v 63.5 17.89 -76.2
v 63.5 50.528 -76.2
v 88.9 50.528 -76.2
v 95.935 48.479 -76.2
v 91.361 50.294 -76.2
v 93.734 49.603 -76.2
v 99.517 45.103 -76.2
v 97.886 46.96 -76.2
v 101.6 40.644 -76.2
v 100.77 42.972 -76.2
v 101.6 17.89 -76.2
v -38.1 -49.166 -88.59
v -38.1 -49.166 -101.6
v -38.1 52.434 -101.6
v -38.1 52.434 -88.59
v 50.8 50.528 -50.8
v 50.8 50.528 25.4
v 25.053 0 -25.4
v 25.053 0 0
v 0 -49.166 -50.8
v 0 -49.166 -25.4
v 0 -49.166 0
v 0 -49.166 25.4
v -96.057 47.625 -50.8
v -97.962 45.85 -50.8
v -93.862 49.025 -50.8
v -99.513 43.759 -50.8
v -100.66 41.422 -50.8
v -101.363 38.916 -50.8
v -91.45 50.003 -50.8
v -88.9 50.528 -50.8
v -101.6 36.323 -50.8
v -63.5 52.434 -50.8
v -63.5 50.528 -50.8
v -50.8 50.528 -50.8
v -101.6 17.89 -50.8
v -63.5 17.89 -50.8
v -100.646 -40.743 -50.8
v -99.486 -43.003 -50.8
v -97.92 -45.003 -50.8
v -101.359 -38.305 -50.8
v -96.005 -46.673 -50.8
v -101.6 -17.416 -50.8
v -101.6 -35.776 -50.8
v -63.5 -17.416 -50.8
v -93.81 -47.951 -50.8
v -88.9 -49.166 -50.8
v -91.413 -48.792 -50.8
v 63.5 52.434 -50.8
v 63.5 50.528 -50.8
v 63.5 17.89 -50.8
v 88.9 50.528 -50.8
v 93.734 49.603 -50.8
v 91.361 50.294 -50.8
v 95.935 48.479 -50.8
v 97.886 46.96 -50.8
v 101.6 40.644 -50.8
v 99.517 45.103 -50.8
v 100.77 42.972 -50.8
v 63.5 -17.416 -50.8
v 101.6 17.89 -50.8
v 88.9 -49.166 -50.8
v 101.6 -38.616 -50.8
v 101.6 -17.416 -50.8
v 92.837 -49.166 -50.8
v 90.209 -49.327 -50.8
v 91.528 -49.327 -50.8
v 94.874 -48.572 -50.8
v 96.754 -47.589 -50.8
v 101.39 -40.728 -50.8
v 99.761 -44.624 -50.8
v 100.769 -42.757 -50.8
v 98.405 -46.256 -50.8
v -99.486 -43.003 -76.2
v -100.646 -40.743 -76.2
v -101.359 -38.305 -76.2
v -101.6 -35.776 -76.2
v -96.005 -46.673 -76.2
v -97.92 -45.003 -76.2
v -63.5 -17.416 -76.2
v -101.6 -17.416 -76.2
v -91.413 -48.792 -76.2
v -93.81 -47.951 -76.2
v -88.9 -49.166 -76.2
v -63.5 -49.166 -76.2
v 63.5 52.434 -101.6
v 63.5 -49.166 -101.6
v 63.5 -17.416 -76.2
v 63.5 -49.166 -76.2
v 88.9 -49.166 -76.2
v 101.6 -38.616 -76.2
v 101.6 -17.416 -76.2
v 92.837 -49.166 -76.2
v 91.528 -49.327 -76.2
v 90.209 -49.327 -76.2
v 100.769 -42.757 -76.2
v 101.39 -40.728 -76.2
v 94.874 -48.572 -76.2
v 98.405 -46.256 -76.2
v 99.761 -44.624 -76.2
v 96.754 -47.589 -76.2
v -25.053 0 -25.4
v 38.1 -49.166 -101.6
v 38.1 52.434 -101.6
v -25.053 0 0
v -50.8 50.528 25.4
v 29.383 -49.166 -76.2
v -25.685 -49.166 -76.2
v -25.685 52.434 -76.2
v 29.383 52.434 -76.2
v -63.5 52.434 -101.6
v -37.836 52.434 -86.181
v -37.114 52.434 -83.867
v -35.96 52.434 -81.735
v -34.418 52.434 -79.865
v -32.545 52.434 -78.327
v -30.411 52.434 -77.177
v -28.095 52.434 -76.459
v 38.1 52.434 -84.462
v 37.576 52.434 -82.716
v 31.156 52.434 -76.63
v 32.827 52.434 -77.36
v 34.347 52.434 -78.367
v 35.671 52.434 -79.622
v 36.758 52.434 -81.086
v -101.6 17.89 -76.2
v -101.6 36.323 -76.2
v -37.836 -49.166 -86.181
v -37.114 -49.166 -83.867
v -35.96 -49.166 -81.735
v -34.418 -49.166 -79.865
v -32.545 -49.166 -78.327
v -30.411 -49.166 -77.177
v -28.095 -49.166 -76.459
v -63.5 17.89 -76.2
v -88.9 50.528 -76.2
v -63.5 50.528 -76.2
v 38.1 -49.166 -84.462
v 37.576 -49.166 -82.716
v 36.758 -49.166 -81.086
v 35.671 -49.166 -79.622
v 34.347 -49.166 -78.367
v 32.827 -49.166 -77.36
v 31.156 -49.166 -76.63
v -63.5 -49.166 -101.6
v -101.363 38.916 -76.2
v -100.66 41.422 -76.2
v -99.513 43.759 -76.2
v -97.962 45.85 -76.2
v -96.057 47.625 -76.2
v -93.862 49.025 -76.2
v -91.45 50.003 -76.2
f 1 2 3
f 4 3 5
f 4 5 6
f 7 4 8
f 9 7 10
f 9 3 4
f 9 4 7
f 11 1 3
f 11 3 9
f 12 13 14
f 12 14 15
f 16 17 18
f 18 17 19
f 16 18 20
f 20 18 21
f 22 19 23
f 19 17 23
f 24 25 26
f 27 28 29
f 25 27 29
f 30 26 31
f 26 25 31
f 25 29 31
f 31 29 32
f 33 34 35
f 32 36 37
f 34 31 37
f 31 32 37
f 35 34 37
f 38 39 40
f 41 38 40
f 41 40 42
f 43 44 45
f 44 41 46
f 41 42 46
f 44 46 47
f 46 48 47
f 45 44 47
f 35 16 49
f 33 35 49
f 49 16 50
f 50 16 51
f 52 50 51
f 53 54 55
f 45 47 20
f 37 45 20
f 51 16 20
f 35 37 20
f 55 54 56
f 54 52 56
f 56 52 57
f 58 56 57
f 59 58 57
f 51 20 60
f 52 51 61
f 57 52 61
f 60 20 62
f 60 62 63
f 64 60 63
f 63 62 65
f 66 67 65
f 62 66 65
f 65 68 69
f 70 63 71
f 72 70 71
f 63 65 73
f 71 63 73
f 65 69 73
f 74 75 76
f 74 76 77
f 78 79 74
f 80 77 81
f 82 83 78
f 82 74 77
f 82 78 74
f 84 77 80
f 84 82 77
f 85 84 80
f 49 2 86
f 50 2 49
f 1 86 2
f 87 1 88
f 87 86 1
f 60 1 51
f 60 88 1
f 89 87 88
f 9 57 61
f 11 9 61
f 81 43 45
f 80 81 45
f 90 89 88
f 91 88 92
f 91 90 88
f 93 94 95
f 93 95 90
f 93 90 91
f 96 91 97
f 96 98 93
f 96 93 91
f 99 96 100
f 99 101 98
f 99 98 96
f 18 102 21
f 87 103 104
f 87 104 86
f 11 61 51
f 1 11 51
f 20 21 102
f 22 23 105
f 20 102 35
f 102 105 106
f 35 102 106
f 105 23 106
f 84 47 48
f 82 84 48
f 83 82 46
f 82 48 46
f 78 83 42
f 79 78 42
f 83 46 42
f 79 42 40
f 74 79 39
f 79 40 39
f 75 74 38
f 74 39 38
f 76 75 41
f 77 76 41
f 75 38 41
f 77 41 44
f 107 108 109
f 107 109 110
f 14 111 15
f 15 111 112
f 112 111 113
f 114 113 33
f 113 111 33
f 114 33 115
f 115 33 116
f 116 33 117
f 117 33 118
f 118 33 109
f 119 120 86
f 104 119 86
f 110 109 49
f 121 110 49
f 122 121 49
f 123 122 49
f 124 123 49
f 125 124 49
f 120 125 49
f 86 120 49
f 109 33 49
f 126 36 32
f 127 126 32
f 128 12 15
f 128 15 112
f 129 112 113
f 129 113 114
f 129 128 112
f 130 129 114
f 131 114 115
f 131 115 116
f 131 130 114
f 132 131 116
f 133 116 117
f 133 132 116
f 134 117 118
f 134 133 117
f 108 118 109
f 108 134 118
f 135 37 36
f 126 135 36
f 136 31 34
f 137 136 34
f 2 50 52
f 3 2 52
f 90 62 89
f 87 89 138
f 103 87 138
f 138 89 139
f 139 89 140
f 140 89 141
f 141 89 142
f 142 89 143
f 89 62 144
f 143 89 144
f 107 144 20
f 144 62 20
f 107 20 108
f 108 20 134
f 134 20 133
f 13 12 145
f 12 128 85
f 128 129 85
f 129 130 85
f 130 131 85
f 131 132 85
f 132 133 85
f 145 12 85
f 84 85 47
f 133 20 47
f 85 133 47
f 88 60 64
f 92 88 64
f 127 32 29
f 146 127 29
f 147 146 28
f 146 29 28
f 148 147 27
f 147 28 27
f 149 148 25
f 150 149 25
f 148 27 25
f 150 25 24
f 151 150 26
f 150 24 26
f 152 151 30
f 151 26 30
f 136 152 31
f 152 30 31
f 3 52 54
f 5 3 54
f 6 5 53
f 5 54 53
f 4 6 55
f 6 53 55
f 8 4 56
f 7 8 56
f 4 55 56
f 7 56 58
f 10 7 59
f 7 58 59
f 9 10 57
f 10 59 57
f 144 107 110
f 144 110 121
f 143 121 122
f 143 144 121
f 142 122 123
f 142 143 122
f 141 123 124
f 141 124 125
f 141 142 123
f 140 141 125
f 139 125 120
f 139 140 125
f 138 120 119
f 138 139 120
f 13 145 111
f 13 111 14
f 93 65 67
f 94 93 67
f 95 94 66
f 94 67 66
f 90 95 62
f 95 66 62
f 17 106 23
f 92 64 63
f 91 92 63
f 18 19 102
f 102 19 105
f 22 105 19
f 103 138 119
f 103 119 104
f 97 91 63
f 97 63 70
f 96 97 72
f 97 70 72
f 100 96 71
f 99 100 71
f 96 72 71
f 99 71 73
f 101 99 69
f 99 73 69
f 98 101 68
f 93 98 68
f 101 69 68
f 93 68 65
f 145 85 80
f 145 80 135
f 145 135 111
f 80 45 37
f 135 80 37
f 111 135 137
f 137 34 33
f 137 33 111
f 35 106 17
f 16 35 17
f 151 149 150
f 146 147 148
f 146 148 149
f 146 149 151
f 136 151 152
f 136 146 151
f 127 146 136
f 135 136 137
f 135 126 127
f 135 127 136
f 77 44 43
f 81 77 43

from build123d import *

# Parameters (mm, degrees)
F1_DEPTH  = 25.4
F3_DEPTH  = 25.4
F5_DEPTH  = 25.4
F6_DEPTH  = 25.4
F8_DEPTH  = 25.4
F9_DEPTH  = 25.4
F11_DEPTH = 101.6


with BuildPart() as f1:
    # F0 (on Top) → F1 (new body)
    with BuildSketch(Plane.XY):
        Polygon((50.8, 50.5276115144), (-50.8, 50.5276115144), (0, -49.1656845147), align=None)
    extrude(amount=F1_DEPTH)

    # F2 (on face) → F3 (join)
    with BuildSketch(Plane(origin=(0, 0, 0), x_dir=(1, 0, 0), z_dir=(0, 0, -1))):
        Polygon((0, 0), (-25.0530062986, 0), (-50.8, -50.5276115144), (50.8, -50.5276115144), (25.0530062986, 0), align=None)
    extrude(amount=F3_DEPTH)

    # F4 (on face) → F5 (join)
    with BuildSketch(Plane(origin=(0, 0, -25.4), x_dir=(1, 0, 0), z_dir=(0, 0, -1))):
        Polygon((25.0530062986, 0), (-25.0530062986, 0), (-50.8, -50.5276115144), (50.8, -50.5276115144), align=None)
    extrude(amount=F5_DEPTH)

    # F4 (on face) → F6 (join)
    with BuildSketch(Plane(origin=(0, 0, -25.4), x_dir=(1, 0, 0), z_dir=(0, 0, -1))):
        Polygon((0, 49.1656845147), (-25.0530062986, 0), (25.0530062986, 0), align=None)
    extrude(amount=F6_DEPTH)

    # F7 (on face) → F8 (join)
    with BuildSketch(Plane(origin=(0, 0, -50.8), x_dir=(1, 0, 0), z_dir=(0, 0, -1))):
        with BuildLine():
            ThreePointArc((92.8366021578, 49.1656845147), (90.8683010789, 49.3477316598), (88.9, 49.1656845147))
            Line((88.9, 49.1656845147), (92.8366021578, 49.1656845147))
        make_face()
        Polygon((-50.8, -50.5276115144), (0, -50.5276115144), (50.8, -50.5276115144), (0, 49.1656845147), align=None)
        with BuildLine():
            Line((0, 49.1656845147), (50.8, -50.5276115144))
            Line((50.8, -50.5276115144), (88.9, -50.5276115144))
            ThreePointArc((88.9, -50.5276115144), (96.9463521433, -47.7655661288), (101.6, -40.6440326455))
            Line((101.6, -40.6440326455), (101.6, -17.8896365181))
            Line((101.6, -17.8896365181), (63.5, -17.8896365181))
            Line((63.5, -17.8896365181), (63.5, 17.4156845147))
            Line((63.5, 17.4156845147), (101.6, 17.4156845147))
            Line((101.6, 17.4156845147), (101.6, 38.6160327387))
            ThreePointArc((101.6, 38.6160327387), (99.1233775867, 45.4733699467), (92.8366021578, 49.1656845147))
            Line((92.8366021578, 49.1656845147), (88.9, 49.1656845147))
            Line((88.9, 49.1656845147), (0, 49.1656845147))
        make_face()
    extrude(amount=F8_DEPTH)

    # F7 (on face) → F9 (join)
    with BuildSketch(Plane(origin=(0, 0, -50.8), x_dir=(1, 0, 0), z_dir=(0, 0, -1))):
        with BuildLine():
            Line((-88.9, -50.5276115144), (-50.8, -50.5276115144))
            Line((-50.8, -50.5276115144), (0, 49.1656845147))
            Line((0, 49.1656845147), (-88.9, 49.1656845147))
            ThreePointArc((-88.9, 49.1656845147), (-97.9199978671, 45.0034008683), (-101.6, 35.7761287374))
            Line((-101.6, 35.7761287374), (-101.6, 17.4156845147))
            Line((-101.6, 17.4156845147), (-63.5, 17.4156845147))
            Line((-63.5, 17.4156845147), (-63.5, -17.8896365181))
            Line((-63.5, -17.8896365181), (-101.6, -17.8896365181))
            Line((-101.6, -17.8896365181), (-101.6, -36.3230473445))
            ThreePointArc((-101.6, -36.3230473445), (-97.9620426965, -45.8501093688), (-88.9, -50.5276115144))
        make_face()
    extrude(amount=F9_DEPTH)

    # F10 (on face) → F11 (join)
    with BuildSketch(Plane.XZ.offset(49.1656845147)):
        with BuildLine():
            Line((-63.5, -50.8), (-63.5, -76.2))
            Line((-63.5, -76.2), (-63.5, -101.6))
            Line((-63.5, -101.6), (-38.1, -101.6))
            Line((-38.1, -101.6), (-38.1, -88.9))
            ThreePointArc((-38.1, -88.9), (-38.1009544934, -88.7452450805), (-38.1, -88.5904901609))
            ThreePointArc((-38.1, -88.5904901609), (-34.4176212284, -79.86523026), (-25.6851438653, -76.2))
            ThreePointArc((-25.6851438653, -76.2), (-25.5550347378, -76.1993253249), (-25.4249256104, -76.2))
            Line((-25.4249256104, -76.2), (26.2085422873, -76.2))
            ThreePointArc((26.2085422873, -76.2), (27.7959470911, -76.0795943408), (29.3833518949, -76.2))
            ThreePointArc((29.3833518949, -76.2), (35.0360054884, -78.9657015641), (38.1, -84.4623856029))
            ThreePointArc((38.1, -84.4623856029), (38.320168092, -86.6038153417), (38.1, -88.7452450805))
            Line((38.1, -88.7452450805), (38.1, -101.6))
            Line((38.1, -101.6), (63.5, -101.6))
            Line((63.5, -101.6), (63.5, -76.2))
            Line((63.5, -76.2), (63.5, -50.8))
            Line((63.5, -50.8), (-63.5, -50.8))
        make_face()
        with BuildLine():
            ThreePointArc((-38.1, -88.5904901609), (-38.1009544934, -88.7452450805), (-38.1, -88.9))
            Line((-38.1, -88.9), (-38.1, -88.5904901609))
        make_face()
        with BuildLine():
            ThreePointArc((-25.4249256104, -76.2), (-25.5550347378, -76.1993253249), (-25.6851438653, -76.2))
            Line((-25.6851438653, -76.2), (-25.4249256104, -76.2))
        make_face()
        with BuildLine():
            Line((38.1, -84.4623856029), (38.1, -88.7452450805))
            ThreePointArc((38.1, -88.7452450805), (38.320168092, -86.6038153417), (38.1, -84.4623856029))
        make_face()
        with BuildLine():
            ThreePointArc((29.3833518949, -76.2), (27.7959470911, -76.0795943408), (26.2085422873, -76.2))
            Line((26.2085422873, -76.2), (29.3833518949, -76.2))
        make_face()
    extrude(amount=-F11_DEPTH)


solid = f1.part
